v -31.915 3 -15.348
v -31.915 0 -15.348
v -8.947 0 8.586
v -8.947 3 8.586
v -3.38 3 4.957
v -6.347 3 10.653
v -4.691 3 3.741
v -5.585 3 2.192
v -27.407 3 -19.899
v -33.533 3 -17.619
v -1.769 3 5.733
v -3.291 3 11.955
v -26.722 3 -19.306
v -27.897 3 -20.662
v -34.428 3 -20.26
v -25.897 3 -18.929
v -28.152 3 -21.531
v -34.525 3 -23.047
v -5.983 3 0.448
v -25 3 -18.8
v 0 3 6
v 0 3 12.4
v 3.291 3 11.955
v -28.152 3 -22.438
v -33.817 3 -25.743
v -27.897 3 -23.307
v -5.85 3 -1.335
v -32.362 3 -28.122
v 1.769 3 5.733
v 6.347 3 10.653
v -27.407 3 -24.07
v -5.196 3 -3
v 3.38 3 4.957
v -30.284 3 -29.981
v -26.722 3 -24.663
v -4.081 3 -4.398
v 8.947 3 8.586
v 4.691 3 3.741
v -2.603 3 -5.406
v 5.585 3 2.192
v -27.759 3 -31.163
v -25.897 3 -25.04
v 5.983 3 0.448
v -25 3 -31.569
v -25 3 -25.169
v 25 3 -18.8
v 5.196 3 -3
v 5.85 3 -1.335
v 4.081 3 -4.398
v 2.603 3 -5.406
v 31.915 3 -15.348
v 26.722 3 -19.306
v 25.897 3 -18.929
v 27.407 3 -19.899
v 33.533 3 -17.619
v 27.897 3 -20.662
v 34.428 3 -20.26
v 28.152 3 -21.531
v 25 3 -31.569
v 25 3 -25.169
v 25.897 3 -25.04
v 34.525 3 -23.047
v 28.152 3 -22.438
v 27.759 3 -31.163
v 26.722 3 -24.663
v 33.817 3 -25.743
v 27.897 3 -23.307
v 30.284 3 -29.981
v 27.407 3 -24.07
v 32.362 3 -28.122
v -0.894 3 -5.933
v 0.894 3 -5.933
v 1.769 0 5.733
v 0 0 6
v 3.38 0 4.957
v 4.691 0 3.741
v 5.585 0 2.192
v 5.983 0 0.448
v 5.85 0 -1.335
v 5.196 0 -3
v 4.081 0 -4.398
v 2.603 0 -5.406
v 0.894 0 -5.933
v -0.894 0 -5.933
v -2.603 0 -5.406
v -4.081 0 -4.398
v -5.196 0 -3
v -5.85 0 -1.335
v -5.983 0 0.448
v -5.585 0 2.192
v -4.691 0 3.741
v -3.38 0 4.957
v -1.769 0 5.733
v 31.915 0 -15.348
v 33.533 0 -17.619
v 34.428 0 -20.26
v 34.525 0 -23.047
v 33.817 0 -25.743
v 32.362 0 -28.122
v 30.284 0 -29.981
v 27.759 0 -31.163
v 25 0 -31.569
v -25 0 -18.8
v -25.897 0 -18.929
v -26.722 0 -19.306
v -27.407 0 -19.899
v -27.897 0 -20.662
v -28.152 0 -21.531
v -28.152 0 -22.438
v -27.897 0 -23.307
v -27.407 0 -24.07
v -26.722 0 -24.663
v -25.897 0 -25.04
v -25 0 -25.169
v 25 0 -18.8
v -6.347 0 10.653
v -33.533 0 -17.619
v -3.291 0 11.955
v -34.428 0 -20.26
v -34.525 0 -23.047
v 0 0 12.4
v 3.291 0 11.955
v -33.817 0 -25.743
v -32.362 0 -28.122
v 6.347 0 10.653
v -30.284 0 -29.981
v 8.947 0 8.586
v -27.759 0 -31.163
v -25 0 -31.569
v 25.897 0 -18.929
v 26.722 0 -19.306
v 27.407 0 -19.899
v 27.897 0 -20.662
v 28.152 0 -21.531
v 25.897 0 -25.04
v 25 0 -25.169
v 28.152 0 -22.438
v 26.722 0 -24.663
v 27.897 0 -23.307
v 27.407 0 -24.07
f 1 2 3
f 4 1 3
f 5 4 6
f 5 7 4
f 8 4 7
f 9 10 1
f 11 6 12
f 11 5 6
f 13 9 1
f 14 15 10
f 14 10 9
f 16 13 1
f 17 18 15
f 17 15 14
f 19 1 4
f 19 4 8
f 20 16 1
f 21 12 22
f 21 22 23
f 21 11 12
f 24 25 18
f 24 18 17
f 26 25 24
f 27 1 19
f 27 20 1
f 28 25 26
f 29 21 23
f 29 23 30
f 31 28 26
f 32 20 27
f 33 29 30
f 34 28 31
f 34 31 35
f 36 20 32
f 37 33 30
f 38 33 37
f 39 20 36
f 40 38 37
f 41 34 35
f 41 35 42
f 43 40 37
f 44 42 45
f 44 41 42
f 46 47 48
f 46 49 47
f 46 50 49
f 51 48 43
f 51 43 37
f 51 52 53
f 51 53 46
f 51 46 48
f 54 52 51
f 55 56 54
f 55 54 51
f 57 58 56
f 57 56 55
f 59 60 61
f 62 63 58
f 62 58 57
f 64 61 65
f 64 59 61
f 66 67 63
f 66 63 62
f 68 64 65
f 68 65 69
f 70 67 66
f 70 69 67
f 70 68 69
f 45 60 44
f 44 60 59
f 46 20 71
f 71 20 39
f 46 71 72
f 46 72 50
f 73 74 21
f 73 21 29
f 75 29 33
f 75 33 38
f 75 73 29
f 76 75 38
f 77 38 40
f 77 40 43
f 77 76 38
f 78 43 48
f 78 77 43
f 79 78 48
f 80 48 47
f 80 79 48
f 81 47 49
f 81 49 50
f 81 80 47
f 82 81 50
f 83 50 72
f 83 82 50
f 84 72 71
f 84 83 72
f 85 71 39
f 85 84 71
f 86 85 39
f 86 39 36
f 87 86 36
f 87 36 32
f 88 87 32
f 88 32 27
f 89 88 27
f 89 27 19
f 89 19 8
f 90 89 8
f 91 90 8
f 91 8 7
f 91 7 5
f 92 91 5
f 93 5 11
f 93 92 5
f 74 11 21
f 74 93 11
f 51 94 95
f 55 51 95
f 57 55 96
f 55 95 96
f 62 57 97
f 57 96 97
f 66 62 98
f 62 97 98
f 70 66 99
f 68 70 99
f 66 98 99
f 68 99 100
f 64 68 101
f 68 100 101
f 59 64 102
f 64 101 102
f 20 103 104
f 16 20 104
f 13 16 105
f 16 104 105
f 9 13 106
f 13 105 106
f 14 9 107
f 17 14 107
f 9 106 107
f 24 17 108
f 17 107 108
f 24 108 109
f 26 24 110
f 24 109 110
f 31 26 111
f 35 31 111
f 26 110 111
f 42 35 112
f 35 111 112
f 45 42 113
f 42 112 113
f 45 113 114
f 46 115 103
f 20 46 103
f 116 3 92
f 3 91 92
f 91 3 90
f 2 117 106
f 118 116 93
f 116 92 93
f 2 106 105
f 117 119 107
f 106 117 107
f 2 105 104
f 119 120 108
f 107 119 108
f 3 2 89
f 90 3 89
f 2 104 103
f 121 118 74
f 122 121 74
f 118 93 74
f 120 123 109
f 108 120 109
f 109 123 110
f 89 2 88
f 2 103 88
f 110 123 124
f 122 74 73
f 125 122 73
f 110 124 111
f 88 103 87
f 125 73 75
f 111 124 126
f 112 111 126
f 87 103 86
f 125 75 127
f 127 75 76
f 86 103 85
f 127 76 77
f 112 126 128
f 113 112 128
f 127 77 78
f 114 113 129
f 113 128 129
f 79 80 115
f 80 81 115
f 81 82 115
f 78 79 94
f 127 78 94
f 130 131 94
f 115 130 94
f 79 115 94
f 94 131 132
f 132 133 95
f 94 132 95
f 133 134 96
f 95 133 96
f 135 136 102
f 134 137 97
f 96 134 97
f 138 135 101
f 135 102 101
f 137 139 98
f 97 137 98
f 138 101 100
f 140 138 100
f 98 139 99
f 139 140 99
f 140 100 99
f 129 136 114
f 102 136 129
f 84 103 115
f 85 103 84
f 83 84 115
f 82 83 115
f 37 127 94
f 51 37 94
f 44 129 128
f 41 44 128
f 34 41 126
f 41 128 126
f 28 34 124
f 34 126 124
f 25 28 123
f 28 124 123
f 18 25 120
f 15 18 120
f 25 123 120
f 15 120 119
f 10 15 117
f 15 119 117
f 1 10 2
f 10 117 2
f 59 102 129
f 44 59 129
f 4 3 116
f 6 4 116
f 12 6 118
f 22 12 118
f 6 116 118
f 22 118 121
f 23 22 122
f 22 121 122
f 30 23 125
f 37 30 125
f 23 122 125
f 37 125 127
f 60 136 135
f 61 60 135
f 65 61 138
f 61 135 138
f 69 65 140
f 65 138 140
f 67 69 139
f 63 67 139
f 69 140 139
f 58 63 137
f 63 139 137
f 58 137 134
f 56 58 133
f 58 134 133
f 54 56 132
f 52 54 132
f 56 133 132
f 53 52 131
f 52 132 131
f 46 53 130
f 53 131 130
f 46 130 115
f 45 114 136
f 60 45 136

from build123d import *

# Parameters (mm, degrees)
SKETCH1_R           = 6
BOSS_EXTRUDE1_DEPTH = 3


with BuildPart() as part:
    # Sketch1 → Boss-Extrude1 (new body)
    with BuildSketch(Plane(origin=(0, 0, 0), x_dir=(1, 0, 0), z_dir=(0, 1, 0))):
        with BuildLine():
            Line((25, 31.568910727), (-25, 31.568910727))
            ThreePointArc((-25, 31.568910727), (-33.816672086, 25.743188919), (-31.915264344, 15.348123269))
            Line((-31.915264344, 15.348123269), (-8.946703241, -8.585831417))
            ThreePointArc((-8.946703241, -8.585831417), (0, -12.4), (8.946703241, -8.585831417))
            Line((8.946703241, -8.585831417), (31.915264344, 15.348123269))
            ThreePointArc((31.915264344, 15.348123269), (33.816672086, 25.743188919), (25, 31.568910727))
        make_face()
        with Locations(Location((0, 0, 0), (0, 0, 270))):
            Circle(SKETCH1_R, mode=Mode.SUBTRACT)
        with BuildLine():
            Line((-25, 25.168910727), (25, 25.168910727))
            ThreePointArc((25, 25.168910727), (28.184455364, 21.984455364), (25, 18.8))
            Line((25, 18.8), (-25, 18.8))
            ThreePointArc((-25, 18.8), (-28.184455364, 21.984455364), (-25, 25.168910727))
        make_face(mode=Mode.SUBTRACT)
    extrude(amount=BOSS_EXTRUDE1_DEPTH)


solid = part.part
